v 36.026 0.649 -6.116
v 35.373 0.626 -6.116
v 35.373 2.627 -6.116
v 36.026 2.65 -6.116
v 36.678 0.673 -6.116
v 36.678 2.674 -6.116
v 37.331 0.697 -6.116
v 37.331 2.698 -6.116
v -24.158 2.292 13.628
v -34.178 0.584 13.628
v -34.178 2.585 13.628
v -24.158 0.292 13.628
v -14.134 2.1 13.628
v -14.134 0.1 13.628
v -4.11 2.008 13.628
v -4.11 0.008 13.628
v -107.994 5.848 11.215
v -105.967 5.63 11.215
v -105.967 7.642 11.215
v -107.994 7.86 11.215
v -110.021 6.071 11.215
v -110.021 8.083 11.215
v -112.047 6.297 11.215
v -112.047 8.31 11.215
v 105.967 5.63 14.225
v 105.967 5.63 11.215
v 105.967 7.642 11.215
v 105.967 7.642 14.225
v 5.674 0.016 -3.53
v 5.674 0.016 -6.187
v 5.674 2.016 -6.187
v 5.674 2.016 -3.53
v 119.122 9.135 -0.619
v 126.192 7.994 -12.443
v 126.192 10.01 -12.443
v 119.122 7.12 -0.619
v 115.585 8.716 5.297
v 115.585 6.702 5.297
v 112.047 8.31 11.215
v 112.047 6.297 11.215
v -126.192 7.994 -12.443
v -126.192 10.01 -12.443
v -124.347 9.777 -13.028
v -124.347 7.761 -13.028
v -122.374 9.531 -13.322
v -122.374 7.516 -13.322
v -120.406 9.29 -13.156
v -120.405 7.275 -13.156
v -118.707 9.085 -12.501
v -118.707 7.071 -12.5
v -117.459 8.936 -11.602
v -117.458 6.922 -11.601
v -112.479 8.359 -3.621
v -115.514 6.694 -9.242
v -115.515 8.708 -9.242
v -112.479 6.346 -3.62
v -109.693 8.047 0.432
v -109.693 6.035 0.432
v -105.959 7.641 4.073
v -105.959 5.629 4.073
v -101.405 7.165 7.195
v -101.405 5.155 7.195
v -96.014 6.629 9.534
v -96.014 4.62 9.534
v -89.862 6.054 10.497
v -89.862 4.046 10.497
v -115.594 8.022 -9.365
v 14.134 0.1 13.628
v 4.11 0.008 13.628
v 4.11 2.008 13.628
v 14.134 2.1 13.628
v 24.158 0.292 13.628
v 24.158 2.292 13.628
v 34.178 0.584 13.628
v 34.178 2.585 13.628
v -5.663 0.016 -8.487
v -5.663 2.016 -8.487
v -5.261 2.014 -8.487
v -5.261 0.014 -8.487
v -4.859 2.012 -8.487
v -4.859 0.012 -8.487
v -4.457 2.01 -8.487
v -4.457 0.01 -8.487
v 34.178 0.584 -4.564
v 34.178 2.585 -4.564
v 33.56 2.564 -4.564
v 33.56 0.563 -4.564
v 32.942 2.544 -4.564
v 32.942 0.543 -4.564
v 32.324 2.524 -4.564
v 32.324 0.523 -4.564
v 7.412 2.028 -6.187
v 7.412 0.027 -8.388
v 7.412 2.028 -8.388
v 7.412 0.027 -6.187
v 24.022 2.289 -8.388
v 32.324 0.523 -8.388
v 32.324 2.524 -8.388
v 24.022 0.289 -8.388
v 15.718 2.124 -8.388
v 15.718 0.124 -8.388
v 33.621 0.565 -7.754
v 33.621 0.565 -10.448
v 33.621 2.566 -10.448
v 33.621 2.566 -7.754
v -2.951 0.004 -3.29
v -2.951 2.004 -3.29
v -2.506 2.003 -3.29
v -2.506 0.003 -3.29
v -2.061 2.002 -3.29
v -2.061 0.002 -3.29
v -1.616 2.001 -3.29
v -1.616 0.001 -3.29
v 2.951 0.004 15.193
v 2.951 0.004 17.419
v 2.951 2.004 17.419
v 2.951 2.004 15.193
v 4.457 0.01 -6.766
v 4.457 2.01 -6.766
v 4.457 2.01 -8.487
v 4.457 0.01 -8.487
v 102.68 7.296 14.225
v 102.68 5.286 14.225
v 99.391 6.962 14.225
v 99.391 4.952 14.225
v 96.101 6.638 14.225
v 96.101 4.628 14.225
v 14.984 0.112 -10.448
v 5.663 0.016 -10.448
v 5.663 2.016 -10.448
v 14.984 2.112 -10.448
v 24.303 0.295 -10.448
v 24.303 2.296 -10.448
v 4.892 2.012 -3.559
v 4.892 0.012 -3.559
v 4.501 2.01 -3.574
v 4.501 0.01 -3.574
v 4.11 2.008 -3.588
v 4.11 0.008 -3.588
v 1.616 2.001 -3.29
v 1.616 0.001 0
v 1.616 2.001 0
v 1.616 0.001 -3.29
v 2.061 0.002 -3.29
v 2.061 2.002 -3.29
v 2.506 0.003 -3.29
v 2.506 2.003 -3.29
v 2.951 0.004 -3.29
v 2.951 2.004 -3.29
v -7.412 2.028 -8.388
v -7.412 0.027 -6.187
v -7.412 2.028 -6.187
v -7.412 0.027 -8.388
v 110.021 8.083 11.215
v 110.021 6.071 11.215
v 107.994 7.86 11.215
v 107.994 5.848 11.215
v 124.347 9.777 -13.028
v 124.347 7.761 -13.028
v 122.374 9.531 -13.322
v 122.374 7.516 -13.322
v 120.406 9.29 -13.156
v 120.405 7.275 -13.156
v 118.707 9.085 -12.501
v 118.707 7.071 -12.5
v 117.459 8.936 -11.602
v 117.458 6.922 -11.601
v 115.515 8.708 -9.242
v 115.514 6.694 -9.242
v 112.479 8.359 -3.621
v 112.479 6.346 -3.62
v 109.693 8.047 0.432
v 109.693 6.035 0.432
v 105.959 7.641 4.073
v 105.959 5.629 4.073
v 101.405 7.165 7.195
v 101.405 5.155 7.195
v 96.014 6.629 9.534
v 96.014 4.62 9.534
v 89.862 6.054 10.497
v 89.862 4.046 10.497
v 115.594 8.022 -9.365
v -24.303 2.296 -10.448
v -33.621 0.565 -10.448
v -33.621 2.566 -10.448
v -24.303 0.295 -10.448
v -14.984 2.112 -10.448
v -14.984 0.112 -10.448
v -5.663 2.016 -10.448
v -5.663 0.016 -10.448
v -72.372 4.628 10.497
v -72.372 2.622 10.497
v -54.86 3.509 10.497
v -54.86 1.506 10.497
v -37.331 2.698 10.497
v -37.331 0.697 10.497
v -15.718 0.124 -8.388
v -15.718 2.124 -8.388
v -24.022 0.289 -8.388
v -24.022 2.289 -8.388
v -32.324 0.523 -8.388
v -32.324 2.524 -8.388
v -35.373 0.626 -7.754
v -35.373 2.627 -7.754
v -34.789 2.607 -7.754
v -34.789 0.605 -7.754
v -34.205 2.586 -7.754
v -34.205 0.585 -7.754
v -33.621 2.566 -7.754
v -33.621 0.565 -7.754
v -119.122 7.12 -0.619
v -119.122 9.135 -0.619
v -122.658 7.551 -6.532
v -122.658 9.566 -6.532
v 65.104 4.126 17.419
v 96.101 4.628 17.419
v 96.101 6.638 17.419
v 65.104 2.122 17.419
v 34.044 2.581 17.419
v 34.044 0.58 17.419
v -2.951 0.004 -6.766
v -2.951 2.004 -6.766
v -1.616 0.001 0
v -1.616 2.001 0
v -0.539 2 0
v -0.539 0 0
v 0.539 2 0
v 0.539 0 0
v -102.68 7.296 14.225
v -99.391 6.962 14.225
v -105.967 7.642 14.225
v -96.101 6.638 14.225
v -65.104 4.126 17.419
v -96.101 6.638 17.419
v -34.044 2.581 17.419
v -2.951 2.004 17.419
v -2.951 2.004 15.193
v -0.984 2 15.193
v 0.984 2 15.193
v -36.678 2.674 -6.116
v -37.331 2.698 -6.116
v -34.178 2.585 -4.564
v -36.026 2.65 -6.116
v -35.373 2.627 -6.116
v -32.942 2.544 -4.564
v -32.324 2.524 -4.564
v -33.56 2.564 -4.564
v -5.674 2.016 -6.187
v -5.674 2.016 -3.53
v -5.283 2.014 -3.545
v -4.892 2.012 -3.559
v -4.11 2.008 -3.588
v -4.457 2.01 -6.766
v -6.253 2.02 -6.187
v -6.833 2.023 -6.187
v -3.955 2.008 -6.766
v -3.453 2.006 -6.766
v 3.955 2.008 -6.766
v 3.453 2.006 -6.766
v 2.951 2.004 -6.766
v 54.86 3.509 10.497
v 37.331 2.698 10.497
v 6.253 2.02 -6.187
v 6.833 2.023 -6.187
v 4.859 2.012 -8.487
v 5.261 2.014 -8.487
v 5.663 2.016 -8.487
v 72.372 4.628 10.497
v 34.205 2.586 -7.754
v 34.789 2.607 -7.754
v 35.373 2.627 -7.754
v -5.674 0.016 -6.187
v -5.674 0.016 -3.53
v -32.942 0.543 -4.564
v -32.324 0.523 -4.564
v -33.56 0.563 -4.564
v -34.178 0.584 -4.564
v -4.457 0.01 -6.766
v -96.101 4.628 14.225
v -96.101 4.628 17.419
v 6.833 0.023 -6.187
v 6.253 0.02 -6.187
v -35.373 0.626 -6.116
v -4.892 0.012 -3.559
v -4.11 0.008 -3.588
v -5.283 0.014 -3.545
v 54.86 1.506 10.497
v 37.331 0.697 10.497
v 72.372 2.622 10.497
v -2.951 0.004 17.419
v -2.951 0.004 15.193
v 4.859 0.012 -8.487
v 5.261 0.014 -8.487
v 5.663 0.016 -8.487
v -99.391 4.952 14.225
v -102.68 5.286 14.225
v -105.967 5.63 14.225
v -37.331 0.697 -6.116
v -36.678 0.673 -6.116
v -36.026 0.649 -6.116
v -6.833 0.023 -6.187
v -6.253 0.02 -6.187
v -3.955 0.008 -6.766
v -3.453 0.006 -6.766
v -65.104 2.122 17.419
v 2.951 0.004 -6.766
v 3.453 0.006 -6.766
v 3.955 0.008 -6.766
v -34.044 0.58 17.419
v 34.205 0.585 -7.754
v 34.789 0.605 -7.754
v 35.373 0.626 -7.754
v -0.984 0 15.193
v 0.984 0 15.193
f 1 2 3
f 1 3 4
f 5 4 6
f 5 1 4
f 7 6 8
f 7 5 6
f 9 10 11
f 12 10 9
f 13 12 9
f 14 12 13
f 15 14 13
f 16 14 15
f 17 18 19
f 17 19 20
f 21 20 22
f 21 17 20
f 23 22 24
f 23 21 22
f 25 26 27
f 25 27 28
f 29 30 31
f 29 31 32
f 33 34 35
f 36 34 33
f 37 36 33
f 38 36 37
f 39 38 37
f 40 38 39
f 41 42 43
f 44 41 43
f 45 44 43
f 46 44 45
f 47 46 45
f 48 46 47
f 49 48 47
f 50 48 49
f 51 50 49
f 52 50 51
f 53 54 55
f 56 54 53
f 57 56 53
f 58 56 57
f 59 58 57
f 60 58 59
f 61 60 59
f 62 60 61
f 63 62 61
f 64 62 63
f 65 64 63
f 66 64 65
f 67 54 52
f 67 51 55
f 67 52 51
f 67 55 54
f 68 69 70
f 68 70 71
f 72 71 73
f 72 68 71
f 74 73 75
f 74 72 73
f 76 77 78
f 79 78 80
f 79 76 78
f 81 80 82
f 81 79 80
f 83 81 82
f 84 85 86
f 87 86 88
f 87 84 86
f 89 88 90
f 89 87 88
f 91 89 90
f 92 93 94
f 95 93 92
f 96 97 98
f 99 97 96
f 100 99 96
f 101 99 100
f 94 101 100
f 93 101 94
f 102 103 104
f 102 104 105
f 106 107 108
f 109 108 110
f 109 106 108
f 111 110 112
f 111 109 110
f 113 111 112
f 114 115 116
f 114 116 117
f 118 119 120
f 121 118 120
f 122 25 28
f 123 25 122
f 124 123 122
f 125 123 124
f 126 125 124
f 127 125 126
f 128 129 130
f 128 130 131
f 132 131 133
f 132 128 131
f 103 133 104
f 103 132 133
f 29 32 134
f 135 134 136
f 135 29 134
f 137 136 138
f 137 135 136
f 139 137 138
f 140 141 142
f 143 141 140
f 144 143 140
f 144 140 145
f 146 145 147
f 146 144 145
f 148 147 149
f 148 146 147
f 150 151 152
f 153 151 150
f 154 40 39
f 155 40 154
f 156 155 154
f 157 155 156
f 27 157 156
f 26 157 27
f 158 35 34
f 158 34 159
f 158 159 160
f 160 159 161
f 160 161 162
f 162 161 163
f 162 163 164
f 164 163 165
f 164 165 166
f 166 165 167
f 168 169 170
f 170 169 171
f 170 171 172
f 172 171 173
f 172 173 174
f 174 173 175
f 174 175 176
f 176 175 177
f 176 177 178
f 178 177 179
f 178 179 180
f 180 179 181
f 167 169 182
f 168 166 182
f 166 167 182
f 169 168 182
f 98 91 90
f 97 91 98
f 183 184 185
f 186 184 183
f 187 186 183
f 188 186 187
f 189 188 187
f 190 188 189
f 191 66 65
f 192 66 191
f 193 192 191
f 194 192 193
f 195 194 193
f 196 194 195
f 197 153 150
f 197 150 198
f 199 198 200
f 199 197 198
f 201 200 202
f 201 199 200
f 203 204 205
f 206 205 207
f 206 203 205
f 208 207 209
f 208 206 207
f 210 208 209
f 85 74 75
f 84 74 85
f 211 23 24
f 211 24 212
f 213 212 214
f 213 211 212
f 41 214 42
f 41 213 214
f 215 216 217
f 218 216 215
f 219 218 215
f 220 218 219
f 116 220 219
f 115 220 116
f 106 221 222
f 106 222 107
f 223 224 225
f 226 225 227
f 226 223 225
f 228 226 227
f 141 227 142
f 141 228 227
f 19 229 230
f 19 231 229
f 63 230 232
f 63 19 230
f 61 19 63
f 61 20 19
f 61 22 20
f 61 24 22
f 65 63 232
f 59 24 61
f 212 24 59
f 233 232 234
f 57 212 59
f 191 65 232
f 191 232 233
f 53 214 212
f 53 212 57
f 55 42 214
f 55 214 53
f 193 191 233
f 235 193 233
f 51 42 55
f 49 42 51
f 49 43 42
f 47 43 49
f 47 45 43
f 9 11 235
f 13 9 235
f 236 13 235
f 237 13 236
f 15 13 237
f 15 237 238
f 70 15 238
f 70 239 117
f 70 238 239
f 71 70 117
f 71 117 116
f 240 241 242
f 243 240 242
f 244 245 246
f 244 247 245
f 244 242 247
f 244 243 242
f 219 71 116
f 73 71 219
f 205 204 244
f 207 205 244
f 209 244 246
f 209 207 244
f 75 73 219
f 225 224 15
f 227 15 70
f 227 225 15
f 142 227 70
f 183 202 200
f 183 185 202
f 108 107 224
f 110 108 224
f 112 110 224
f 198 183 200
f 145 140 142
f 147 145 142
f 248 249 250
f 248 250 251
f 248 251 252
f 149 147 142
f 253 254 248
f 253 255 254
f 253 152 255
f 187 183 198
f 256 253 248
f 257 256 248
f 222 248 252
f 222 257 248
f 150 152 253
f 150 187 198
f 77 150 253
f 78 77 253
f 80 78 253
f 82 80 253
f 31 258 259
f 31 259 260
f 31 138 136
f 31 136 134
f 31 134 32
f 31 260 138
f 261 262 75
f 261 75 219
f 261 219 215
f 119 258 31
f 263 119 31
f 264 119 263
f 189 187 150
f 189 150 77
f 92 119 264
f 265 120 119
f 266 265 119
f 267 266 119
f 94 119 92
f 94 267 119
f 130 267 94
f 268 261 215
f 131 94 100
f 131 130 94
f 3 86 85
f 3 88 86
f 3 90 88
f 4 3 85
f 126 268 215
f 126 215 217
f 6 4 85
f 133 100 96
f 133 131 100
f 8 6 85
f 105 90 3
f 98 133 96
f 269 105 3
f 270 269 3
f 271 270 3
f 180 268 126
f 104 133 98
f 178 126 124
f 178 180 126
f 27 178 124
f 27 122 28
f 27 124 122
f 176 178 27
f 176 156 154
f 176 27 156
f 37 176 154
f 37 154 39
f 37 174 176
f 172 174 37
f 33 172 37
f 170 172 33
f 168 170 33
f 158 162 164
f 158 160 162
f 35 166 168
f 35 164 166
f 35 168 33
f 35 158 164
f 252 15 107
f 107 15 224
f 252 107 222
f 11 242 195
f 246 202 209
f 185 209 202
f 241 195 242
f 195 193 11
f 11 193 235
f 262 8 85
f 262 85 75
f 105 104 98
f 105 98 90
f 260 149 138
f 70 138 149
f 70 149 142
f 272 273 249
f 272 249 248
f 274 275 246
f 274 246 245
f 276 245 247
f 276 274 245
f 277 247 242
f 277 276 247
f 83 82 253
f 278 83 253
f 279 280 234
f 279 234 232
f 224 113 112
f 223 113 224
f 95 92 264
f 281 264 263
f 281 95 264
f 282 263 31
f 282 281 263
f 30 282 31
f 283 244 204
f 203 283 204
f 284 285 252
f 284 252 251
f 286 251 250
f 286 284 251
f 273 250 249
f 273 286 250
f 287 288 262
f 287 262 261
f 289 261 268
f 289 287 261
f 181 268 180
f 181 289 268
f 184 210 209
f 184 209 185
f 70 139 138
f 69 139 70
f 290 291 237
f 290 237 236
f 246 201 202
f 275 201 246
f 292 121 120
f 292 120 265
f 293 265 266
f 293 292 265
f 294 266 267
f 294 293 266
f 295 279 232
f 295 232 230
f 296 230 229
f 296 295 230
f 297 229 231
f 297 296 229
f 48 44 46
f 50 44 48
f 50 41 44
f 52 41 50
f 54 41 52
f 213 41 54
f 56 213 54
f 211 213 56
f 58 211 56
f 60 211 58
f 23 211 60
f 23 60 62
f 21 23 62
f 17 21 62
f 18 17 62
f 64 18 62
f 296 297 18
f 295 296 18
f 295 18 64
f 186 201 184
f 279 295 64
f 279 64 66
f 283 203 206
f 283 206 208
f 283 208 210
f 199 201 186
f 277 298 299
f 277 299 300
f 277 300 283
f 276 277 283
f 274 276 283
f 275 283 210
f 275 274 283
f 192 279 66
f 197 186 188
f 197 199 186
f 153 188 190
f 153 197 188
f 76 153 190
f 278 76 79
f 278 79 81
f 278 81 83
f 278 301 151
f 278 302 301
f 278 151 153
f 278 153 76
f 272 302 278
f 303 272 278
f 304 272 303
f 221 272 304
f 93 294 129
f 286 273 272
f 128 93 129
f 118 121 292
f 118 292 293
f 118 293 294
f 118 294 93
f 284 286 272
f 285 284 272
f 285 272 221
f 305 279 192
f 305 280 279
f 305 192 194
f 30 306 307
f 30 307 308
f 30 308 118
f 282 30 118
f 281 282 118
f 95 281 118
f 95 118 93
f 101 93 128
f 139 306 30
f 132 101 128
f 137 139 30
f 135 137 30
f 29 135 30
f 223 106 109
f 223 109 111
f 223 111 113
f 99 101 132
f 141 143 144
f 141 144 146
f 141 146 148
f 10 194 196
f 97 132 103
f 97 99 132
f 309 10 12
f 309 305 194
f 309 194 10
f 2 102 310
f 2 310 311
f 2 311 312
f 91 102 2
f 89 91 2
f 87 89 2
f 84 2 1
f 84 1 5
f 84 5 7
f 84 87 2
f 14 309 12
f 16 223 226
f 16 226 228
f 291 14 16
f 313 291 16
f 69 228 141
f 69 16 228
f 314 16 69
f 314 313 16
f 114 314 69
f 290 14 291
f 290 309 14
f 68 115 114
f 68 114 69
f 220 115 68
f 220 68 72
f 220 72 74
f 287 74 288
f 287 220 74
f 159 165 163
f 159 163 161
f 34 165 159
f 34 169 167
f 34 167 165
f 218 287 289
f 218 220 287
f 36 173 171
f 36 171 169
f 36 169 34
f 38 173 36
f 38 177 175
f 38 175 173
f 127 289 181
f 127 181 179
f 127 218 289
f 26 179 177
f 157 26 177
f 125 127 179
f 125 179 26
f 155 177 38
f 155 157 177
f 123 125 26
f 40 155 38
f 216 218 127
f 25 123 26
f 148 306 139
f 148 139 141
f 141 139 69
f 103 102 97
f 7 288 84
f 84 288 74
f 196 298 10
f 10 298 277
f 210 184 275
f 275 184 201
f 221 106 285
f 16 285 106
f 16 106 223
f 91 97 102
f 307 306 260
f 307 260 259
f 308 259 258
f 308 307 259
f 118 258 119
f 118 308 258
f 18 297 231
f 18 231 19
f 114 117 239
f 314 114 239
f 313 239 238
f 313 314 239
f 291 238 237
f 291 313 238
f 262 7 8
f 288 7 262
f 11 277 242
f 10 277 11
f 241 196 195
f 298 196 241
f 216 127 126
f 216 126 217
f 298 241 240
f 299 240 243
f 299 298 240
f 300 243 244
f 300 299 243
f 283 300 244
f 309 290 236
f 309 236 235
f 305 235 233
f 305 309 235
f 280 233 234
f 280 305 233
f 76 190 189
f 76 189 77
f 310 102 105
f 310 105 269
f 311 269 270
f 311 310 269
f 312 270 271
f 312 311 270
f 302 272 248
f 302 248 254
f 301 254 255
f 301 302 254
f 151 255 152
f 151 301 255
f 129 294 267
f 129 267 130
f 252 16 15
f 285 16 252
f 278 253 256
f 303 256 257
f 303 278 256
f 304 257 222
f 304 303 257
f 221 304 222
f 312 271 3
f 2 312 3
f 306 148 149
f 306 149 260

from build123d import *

# Parameters (mm, degrees)
F0_R     = 1000
F0_R_2   = 998
F1_DEPTH = 25
F3_DEPTH = 25


with BuildPart() as f1:
    # F0 (on Top) → F1 (new body, symmetric)
    with BuildSketch(Plane.XY):
        with Locations((0, 1000)):
            Circle(F0_R)
        with Locations((0, 1000)):
            Circle(F0_R_2, mode=Mode.SUBTRACT)
    extrude(amount=F1_DEPTH, both=True)

    # F2 (on Front) → F3 (intersect)
    with BuildSketch(Plane.XZ):
        with BuildLine():
            Line((-1.616309979, 0), (0, 0))
            Line((0, 0), (1.616309979, 0))
            Line((1.616309979, 0), (1.616309979, -3.2897594204))
            Line((1.616309979, -3.2897594204), (2.9510622844, -3.2897594204))
            Line((2.9510622844, -3.2897594204), (2.9510622844, -6.7660715715))
            Line((2.9510622844, -6.7660715715), (4.4573904015, -6.7660715715))
            Line((4.4573904015, -6.7660715715), (4.4573904015, -8.4873163426))
            Line((4.4573904015, -8.4873163426), (5.6625748985, -8.4873163426))
            Line((5.6625748985, -8.4873163426), (5.6625748985, -10.4484493197))
            Line((5.6625748985, -10.4484493197), (33.6209498346, -10.4484493197))
            Line((33.6209498346, -10.4484493197), (33.6209498346, -7.7543510409))
            Line((33.6209498346, -7.7543510409), (35.3727713227, -7.7543510409))
            Line((35.3727713227, -7.7543510409), (35.3727713227, -6.1156815202))
            Line((35.3727713227, -6.1156815202), (37.3309366405, -6.1156815202))
            Line((37.3309366405, -6.1156815202), (37.3309366405, 10.4968165694))
            Line((37.3309366405, 10.4968165694), (39.1029454768, 10.4968165694))
            Line((39.1029454768, 10.4968165694), (89.8619368672, 10.4968165694))
            add(Edge.make_bspline(
                [(126.191938709, -12.4427201226), (120.2694493498, -14.7278444711), (114.6684140146, -9.6957288454), (111.4944007362, 1.103961054), (98.1648231668, 10.4968165694), (89.8619368672, 10.4968165694)],
                knots=[0, 0, 0, 0, 0.2916301086, 0.5812201323, 1, 1, 1, 1], degree=3))
            Line((126.191938709, -12.4427201226), (112.0467338183, 11.2148681656))
            Line((112.0467338183, 11.2148681656), (105.9674322605, 11.2148681656))
            Line((105.9674322605, 11.2148681656), (105.9674322605, 14.2248952761))
            Line((105.9674322605, 14.2248952761), (96.1012393236, 14.2248952761))
            Line((96.1012393236, 14.2248952761), (96.1012393236, 17.4190327525))
            Line((96.1012393236, 17.4190327525), (39.1029454768, 17.4190327525))
            Line((39.1029454768, 17.4190327525), (2.9510622844, 17.4190327525))
            Line((2.9510622844, 17.4190327525), (2.9510622844, 15.192626947))
            Line((2.9510622844, 15.192626947), (0, 15.192626947))
            Line((0, 15.192626947), (-2.9510622844, 15.192626947))
            Line((-2.9510622844, 15.192626947), (-2.9510622844, 17.4190327525))
            Line((-2.9510622844, 17.4190327525), (-39.1029454768, 17.4190327525))
            Line((-39.1029454768, 17.4190327525), (-39.1029454768, 10.4968165694))
            Line((-39.1029454768, 10.4968165694), (-37.3309366405, 10.4968165694))
            Line((-37.3309366405, 10.4968165694), (-37.3309366405, -6.1156815202))
            Line((-37.3309366405, -6.1156815202), (-35.3727713227, -6.1156815202))
            Line((-35.3727713227, -6.1156815202), (-35.3727713227, -7.7543510409))
            Line((-35.3727713227, -7.7543510409), (-33.6209498346, -7.7543510409))
            Line((-33.6209498346, -7.7543510409), (-33.6209498346, -10.4484493197))
            Line((-33.6209498346, -10.4484493197), (-5.6625748985, -10.4484493197))
            Line((-5.6625748985, -10.4484493197), (-5.6625748985, -8.4873163426))
            Line((-5.6625748985, -8.4873163426), (-4.4573904015, -8.4873163426))
            Line((-4.4573904015, -8.4873163426), (-4.4573904015, -6.7660715715))
            Line((-4.4573904015, -6.7660715715), (-2.9510622844, -6.7660715715))
            Line((-2.9510622844, -6.7660715715), (-2.9510622844, -3.2897594204))
            Line((-2.9510622844, -3.2897594204), (-1.616309979, -3.2897594204))
            Line((-1.616309979, -3.2897594204), (-1.616309979, 0))
        make_face()
        Polygon((-5.6740404107, -6.1866864562), (-7.4121118523, -6.1866864562), (-7.4121118523, -8.3883497864), (-32.3244668543, -8.3883497864), (-32.3244668543, -4.5644077472), (-34.1784097254, -4.5644077472), (-34.1784097254, 13.6282863095), (-4.1097765788, 13.6282863095), (-4.1097765788, -3.5880359381), (-5.6740404107, -3.5300969637), align=None, mode=Mode.SUBTRACT)
        Polygon((5.6740404107, -3.5300969637), (4.1097765788, -3.5880359381), (4.1097765788, 13.6282863095), (34.1784097254, 13.6282863095), (34.1784097254, -4.5644077472), (32.3244668543, -4.5644077472), (32.3244668543, -8.3883497864), (7.4121118523, -8.3883497864), (7.4121118523, -6.1866864562), (5.6740404107, -6.1866864562), align=None, mode=Mode.SUBTRACT)
        with BuildLine():
            Line((-89.8619368672, 10.4968165694), (-39.1029454768, 10.4968165694))
            Line((-39.1029454768, 10.4968165694), (-39.1029454768, 17.4190327525))
            Line((-39.1029454768, 17.4190327525), (-96.1012393236, 17.4190327525))
            Line((-96.1012393236, 17.4190327525), (-96.1012393236, 14.2248952761))
            Line((-96.1012393236, 14.2248952761), (-105.9674322605, 14.2248952761))
            Line((-105.9674322605, 14.2248952761), (-105.9674322605, 11.2148681656))
            Line((-105.9674322605, 11.2148681656), (-112.0467338183, 11.2148681656))
            Line((-112.0467338183, 11.2148681656), (-126.191938709, -12.4427201226))
            add(Edge.make_bspline(
                [(-126.191938709, -12.4427201226), (-120.2694493498, -14.7278444711), (-114.6684140146, -9.6957288454), (-111.4944007362, 1.103961054), (-98.1648231668, 10.4968165694), (-89.8619368672, 10.4968165694)],
                knots=[0, 0, 0, 0, 0.2916301086, 0.5812201323, 1, 1, 1, 1], degree=3))
        make_face()
    extrude(amount=-F3_DEPTH, mode=Mode.INTERSECT)


solid = f1.part
